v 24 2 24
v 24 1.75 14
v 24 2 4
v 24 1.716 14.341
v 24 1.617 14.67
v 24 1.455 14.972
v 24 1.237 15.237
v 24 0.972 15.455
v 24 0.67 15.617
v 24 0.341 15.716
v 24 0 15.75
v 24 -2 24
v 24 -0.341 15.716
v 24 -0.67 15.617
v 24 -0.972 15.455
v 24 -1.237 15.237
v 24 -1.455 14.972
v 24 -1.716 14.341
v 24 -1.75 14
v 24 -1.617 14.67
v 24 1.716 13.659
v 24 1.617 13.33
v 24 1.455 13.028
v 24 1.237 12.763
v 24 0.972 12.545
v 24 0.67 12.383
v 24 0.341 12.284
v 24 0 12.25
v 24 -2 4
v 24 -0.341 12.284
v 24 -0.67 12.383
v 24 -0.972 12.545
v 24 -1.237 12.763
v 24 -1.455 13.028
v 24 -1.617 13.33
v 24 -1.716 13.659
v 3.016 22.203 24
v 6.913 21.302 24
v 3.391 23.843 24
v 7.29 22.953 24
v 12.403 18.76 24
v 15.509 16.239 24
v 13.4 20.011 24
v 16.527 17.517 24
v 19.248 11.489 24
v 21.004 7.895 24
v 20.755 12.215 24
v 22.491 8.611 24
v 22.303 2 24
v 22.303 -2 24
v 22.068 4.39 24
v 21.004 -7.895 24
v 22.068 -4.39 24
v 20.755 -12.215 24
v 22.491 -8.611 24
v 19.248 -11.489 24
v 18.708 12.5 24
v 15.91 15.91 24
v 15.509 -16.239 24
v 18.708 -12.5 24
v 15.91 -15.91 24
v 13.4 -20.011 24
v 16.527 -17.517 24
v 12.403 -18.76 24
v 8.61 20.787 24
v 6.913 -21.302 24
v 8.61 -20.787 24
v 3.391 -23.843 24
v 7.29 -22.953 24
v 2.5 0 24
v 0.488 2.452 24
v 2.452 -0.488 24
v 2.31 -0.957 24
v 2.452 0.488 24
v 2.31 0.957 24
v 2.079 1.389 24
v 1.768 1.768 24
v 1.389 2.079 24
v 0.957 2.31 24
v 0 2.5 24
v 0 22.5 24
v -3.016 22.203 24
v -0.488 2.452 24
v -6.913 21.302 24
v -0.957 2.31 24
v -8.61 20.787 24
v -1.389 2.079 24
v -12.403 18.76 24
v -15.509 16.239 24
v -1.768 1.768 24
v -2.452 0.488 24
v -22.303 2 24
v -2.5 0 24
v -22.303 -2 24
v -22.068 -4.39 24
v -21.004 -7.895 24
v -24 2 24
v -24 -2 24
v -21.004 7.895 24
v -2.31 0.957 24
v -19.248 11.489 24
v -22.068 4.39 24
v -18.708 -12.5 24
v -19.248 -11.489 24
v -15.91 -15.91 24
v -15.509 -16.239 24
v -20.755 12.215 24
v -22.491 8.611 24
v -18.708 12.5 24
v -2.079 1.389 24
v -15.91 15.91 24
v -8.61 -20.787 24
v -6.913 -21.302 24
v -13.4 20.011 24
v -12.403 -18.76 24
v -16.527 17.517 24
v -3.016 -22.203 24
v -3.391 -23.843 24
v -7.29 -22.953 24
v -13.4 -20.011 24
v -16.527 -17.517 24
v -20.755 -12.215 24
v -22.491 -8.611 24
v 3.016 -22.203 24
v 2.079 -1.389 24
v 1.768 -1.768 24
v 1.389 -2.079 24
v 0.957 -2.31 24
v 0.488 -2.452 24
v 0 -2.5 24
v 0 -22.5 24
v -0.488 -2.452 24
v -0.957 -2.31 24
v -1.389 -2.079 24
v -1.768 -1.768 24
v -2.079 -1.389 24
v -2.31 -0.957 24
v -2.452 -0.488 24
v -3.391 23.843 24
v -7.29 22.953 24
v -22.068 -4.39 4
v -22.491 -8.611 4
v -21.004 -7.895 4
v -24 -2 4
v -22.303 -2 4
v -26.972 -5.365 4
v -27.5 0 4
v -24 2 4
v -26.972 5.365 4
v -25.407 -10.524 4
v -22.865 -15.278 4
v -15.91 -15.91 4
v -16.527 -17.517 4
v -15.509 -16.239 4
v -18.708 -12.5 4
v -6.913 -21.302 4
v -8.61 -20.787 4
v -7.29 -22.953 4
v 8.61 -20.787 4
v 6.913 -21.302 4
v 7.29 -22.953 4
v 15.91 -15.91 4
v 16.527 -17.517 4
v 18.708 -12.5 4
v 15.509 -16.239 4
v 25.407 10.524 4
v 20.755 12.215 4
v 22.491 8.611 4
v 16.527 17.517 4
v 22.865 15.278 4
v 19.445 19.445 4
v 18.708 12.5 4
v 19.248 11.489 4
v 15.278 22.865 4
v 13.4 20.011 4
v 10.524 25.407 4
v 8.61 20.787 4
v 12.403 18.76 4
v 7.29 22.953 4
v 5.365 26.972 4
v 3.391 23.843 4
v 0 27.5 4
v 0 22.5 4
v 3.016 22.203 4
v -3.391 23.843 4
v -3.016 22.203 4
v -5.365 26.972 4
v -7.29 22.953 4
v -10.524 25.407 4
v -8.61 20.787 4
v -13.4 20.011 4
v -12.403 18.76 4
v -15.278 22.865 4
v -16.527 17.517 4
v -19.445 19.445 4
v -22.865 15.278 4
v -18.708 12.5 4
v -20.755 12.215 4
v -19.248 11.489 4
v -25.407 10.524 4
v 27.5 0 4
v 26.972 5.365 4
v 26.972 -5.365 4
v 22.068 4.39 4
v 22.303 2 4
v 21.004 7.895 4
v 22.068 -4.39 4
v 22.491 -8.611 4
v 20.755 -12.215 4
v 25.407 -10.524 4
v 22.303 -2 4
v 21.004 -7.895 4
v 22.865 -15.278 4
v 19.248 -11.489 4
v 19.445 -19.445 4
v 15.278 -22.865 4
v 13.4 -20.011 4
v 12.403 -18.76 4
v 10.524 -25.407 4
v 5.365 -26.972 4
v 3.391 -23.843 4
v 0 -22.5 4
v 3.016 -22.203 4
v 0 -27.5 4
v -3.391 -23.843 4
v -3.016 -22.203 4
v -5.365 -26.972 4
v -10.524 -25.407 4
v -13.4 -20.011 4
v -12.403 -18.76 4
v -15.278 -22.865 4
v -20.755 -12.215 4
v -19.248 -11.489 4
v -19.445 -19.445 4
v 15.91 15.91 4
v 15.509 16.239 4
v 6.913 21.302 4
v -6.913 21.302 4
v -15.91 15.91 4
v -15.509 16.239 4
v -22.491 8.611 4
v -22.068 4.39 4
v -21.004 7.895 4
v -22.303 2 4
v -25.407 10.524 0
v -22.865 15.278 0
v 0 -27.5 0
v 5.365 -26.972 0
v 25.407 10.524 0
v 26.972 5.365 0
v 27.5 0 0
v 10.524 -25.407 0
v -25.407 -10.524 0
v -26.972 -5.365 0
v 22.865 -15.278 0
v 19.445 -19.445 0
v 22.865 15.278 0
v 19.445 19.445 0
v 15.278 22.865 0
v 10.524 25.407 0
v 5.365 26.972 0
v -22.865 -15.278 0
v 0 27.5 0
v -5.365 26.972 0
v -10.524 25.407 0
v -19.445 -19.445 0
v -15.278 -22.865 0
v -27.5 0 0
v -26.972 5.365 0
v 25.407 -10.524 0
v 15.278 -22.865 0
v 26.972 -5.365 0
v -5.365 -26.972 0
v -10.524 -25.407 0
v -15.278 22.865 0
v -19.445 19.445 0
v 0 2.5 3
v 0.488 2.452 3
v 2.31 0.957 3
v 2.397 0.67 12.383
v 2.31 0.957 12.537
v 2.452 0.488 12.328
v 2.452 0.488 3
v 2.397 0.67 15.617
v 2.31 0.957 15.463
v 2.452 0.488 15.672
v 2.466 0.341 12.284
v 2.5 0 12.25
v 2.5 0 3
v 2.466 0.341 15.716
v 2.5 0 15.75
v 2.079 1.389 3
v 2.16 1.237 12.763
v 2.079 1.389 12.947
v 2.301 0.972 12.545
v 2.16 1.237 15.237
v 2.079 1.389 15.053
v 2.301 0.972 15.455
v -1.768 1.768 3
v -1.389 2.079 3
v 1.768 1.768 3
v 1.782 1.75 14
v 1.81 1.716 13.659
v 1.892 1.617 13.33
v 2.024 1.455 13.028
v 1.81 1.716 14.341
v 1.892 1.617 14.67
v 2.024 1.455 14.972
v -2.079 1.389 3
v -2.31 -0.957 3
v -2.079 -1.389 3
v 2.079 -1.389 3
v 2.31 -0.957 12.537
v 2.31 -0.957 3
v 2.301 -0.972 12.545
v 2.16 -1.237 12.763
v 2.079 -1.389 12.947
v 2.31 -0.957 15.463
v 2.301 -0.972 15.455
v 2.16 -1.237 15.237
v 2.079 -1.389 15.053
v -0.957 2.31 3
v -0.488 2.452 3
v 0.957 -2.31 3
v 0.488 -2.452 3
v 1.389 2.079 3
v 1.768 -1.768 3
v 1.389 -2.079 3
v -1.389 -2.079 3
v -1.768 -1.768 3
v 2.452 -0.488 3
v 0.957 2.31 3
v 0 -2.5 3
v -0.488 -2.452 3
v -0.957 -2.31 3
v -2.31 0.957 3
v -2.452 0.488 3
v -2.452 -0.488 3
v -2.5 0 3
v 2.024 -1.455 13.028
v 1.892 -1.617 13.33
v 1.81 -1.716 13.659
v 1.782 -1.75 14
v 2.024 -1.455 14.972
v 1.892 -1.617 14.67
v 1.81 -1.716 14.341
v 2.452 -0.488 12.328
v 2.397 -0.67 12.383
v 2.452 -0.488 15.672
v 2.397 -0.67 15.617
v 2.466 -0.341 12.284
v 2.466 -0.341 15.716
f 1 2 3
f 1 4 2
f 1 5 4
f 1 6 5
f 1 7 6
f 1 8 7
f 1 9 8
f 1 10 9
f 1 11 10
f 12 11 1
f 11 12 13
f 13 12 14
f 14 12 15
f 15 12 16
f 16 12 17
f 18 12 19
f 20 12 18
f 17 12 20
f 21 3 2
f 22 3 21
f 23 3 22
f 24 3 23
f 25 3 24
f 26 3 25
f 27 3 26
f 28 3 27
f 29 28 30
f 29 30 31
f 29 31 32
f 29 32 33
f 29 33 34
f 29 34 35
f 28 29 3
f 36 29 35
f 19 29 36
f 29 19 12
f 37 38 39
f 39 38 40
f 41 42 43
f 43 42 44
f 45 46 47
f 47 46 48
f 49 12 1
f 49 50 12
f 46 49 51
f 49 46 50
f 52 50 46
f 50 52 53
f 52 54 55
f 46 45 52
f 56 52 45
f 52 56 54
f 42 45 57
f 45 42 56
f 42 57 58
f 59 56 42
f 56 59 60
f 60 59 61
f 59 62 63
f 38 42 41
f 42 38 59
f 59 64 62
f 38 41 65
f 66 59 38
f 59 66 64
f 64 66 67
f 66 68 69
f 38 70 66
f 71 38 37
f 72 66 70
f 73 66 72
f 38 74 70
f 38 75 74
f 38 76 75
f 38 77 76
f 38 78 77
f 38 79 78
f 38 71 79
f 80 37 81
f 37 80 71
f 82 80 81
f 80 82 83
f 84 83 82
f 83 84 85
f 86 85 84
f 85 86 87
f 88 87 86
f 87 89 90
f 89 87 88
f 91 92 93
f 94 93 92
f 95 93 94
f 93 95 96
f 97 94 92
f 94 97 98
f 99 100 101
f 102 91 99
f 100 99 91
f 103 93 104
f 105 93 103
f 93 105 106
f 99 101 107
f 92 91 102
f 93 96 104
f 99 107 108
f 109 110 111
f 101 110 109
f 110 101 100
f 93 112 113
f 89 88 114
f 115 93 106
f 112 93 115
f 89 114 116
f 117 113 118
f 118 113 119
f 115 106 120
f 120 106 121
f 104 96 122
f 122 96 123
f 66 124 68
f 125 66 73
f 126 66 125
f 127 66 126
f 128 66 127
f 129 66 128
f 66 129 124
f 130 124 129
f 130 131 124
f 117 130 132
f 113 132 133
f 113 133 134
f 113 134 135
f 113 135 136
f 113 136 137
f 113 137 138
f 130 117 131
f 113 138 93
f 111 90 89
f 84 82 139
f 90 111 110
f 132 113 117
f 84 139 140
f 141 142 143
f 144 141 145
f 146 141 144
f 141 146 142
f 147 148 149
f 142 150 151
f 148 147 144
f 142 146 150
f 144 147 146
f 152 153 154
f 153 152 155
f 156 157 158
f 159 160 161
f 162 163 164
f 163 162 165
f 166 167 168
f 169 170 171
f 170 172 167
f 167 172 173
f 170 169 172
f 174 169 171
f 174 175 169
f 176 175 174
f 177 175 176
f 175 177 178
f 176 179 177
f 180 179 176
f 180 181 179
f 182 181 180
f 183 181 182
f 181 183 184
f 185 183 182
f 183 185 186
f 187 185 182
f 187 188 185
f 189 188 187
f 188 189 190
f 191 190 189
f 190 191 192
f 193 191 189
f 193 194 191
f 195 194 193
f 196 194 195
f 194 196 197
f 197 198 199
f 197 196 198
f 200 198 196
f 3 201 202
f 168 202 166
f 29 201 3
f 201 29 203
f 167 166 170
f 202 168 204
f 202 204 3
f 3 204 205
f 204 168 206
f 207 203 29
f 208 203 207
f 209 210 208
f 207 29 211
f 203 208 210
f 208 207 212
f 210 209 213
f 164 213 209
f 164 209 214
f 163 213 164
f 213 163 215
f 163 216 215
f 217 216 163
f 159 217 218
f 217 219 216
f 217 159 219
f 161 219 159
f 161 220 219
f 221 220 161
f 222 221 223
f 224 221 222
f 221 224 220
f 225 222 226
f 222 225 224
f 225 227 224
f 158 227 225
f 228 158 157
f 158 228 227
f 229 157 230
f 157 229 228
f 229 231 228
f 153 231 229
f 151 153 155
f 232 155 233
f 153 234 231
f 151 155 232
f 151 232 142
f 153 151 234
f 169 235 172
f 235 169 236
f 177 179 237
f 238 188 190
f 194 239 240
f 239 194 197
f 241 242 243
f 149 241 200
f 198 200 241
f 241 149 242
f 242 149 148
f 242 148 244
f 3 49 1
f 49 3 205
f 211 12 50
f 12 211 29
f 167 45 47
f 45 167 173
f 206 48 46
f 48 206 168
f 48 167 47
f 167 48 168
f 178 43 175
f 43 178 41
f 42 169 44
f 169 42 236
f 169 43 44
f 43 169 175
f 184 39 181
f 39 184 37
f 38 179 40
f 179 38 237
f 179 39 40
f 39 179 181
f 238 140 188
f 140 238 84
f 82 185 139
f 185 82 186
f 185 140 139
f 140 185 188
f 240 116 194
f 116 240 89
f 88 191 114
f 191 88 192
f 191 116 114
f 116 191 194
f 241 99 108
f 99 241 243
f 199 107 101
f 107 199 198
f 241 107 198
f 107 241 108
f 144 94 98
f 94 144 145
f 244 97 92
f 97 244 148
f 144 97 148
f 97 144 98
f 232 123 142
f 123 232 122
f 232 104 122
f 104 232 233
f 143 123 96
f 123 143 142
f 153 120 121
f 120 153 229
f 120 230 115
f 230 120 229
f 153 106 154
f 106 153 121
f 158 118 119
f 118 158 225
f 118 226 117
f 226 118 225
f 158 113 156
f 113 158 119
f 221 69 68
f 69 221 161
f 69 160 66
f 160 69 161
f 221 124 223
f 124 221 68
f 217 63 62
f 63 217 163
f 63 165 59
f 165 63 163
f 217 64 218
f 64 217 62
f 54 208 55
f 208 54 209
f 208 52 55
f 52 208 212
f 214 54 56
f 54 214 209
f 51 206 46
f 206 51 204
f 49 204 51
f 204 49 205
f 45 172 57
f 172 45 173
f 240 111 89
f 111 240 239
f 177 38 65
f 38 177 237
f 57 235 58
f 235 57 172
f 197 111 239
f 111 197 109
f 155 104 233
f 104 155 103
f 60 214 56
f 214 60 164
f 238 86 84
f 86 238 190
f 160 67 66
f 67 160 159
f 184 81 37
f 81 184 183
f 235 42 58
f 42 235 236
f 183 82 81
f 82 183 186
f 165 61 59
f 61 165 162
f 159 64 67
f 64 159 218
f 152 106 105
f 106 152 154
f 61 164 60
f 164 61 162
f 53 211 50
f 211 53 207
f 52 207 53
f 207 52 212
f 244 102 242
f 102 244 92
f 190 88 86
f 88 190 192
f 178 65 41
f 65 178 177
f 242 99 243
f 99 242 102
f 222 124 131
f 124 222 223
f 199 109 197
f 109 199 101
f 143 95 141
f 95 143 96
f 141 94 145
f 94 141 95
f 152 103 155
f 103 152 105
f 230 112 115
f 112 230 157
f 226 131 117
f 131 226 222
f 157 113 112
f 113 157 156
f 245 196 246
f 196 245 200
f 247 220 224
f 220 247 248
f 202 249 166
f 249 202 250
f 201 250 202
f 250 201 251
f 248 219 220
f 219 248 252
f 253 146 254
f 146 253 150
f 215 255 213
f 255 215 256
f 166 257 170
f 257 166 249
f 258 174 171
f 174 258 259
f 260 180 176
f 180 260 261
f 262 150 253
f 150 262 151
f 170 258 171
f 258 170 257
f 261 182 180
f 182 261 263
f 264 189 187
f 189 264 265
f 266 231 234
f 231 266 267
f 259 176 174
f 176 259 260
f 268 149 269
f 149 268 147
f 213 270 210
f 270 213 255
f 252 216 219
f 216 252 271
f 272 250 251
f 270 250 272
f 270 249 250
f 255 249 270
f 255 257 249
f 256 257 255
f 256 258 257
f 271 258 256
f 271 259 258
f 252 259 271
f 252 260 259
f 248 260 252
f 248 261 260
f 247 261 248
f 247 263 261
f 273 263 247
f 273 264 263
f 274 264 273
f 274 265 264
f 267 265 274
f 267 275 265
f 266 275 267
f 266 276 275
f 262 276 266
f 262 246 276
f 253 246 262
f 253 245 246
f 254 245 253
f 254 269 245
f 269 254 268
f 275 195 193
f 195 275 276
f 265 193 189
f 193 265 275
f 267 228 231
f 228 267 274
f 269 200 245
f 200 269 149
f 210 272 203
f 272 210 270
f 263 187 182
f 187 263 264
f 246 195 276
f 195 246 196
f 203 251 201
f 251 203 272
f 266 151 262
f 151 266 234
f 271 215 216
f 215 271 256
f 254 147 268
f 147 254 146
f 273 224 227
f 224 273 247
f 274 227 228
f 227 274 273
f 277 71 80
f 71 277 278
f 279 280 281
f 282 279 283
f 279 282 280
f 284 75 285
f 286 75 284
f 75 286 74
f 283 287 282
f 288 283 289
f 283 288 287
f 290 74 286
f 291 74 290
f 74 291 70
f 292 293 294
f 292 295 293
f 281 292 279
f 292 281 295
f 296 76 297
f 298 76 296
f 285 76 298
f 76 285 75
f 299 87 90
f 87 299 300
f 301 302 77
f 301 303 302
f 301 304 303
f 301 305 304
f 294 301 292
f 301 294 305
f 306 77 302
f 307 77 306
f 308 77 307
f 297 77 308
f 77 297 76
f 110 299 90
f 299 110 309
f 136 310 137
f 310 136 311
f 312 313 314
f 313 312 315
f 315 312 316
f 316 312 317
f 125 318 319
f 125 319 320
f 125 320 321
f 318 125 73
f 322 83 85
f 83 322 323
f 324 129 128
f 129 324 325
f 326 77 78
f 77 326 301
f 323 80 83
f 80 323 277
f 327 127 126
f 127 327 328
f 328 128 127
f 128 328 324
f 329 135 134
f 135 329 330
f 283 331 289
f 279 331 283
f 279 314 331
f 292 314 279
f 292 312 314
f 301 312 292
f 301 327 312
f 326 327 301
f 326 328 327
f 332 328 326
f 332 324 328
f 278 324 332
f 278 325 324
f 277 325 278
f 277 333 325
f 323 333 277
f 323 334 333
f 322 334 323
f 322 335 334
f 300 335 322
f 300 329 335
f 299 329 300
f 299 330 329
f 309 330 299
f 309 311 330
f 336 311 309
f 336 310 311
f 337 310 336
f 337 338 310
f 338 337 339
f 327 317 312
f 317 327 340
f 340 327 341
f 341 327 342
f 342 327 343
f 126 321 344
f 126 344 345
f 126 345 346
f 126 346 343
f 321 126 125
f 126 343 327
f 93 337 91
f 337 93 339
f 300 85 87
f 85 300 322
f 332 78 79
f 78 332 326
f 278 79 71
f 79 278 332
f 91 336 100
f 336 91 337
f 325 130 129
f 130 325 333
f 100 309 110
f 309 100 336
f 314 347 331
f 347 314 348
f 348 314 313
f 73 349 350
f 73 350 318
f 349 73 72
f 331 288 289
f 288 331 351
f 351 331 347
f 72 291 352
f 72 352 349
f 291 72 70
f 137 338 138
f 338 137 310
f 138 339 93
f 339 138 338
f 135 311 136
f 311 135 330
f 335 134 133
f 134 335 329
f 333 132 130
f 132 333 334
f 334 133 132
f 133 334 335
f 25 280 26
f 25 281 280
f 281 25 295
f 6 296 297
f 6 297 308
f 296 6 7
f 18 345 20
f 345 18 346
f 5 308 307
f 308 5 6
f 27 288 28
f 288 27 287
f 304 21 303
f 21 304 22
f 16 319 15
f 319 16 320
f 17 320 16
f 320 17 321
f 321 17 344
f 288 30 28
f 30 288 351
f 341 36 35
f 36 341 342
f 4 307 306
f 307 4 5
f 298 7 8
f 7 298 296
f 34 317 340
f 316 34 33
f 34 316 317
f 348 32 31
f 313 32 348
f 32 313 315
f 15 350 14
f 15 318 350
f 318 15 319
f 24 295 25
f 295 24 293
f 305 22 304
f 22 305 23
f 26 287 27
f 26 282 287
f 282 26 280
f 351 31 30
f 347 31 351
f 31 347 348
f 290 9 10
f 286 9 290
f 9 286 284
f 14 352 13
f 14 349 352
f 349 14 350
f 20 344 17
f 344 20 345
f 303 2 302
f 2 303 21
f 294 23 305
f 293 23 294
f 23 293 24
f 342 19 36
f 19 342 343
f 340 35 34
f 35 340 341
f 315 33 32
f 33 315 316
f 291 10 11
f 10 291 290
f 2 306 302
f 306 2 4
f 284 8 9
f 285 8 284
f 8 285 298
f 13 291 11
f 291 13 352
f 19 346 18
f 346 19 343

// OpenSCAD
$fn = 32;

// ----------------------------------------------------------------------
// Control knob: skirt knob with grip ribs
// ----------------------------------------------------------------------

// --- parameters (mm) ---
skirt_d = 55;             // skirt diameter
skirt_t = 4;              // skirt thickness
rib_w = 4;                // grip rib width
rib_out = 2.5;            // grip rib radial protrusion
n_ribs = 14;              // number of grip ribs
knob_d = 45;              // knob body diameter
knob_h = 20;              // knob body height
bore_d = 5;               // shaft bore diameter
set_d = 3.5;              // set screw bore diameter

rib_step = 360 / n_ribs;  // rib angular step
total_h = skirt_t + knob_h;  // overall height

difference() {
  union() {
    translate([0, 0, skirt_t]) cylinder(h = knob_h, d = knob_d);
    cylinder(h = skirt_t, d = skirt_d);
    for (i = [0 : n_ribs - 1])
      rotate([0, 0, i * rib_step])
        translate([knob_d / 2 - 1, -rib_w / 2, skirt_t])
          cube([rib_out, rib_w, knob_h]);
  }
  translate([0, 0, skirt_t - 1]) cylinder(h = knob_h + 2, d = bore_d);
  translate([-1, 0, skirt_t + knob_h / 2]) rotate([0, 90, 0])
    cylinder(h = knob_d / 2 + bore_d / 2 + 2, d = set_d);
}
